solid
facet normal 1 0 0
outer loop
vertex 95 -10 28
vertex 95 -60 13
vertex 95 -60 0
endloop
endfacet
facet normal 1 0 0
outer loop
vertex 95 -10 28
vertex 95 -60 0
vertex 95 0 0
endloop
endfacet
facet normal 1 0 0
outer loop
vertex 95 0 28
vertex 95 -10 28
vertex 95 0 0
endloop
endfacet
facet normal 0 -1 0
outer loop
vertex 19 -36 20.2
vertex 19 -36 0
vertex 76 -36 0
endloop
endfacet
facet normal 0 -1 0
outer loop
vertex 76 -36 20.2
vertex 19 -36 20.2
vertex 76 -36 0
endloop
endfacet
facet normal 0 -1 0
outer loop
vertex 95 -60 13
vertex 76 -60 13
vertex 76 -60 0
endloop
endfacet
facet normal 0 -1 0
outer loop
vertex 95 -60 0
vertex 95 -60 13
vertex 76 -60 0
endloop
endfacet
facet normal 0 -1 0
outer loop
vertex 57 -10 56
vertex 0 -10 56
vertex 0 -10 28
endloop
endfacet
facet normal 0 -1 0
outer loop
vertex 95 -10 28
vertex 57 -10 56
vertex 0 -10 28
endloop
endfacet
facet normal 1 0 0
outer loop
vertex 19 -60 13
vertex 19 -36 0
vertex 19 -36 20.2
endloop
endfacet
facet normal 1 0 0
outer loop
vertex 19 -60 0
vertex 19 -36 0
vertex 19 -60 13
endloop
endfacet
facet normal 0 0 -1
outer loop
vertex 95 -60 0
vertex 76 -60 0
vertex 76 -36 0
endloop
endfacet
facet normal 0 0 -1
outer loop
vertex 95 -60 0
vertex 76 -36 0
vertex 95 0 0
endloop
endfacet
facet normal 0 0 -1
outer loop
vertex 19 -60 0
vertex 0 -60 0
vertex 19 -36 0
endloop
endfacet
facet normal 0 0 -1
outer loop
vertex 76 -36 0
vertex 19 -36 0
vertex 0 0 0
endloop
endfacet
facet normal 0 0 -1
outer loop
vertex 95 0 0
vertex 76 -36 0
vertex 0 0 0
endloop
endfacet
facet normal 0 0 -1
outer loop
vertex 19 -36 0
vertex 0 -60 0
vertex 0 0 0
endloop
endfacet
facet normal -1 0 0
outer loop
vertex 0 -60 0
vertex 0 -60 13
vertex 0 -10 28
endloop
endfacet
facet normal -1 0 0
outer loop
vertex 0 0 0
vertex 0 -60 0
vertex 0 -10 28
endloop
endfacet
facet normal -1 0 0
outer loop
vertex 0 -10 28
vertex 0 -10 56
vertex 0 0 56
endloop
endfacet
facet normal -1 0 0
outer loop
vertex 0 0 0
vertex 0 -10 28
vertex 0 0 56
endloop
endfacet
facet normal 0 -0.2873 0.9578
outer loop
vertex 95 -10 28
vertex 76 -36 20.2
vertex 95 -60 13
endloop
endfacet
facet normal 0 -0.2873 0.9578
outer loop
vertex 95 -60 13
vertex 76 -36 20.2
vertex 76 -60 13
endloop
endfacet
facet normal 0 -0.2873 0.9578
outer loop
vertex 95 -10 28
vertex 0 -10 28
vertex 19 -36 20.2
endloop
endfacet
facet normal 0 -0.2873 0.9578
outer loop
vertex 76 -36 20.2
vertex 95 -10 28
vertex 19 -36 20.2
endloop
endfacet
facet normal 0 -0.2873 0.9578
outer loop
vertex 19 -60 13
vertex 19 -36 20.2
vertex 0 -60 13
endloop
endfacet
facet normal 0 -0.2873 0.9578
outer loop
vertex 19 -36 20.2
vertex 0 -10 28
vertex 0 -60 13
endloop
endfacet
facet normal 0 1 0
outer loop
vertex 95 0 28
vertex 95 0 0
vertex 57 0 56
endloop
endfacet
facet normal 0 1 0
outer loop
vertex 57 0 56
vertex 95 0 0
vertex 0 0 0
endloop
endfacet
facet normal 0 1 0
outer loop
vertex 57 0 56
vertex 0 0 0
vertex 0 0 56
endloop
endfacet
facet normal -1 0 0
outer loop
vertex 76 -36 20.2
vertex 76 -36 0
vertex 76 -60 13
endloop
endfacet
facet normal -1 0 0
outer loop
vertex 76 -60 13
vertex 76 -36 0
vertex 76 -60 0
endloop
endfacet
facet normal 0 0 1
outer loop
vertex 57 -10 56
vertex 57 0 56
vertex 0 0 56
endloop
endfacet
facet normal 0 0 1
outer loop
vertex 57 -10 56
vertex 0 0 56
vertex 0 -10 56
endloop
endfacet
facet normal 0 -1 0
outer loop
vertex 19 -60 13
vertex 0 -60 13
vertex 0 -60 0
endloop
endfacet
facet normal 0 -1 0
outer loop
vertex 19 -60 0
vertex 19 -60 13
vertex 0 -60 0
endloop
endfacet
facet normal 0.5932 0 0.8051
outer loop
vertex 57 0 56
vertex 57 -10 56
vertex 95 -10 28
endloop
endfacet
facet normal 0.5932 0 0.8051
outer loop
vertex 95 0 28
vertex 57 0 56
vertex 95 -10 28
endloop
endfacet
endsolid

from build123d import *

# Parameters (mm, degrees)
F1_DEPTH = 95
F3_DEPTH = 10.001
F4_W     = 57
F4_H     = 24
F6_DEPTH = 180
F7_W     = 57
F7_H     = 24
F8_DEPTH = 56.001
F9_DEPTH = 179


# Not quite as in the source:
# - an extrude ends at something that could not be found from the text; its depth is read off the source's solid
# - a feature of the source that left no trace in its solid (it failed there, or was rolled back) is left out
# - a feature names something its author has since deleted; it is built from what else it names


with BuildPart() as f1:
    # F0 (on Right) → F1 (new body)
    with BuildSketch(Plane.YZ):
        Polygon((0, 56), (-10, 56), (-10, 28), (-60, 13), (-60, 0), (0, 0), align=None)
    extrude(amount=F1_DEPTH)

    # F2 (on face) → F3 (cut, through all)
    with BuildSketch(Plane.XZ.offset(10)):
        Polygon((95, 56), (57, 56), (95, 28), align=None)
    extrude(amount=-F3_DEPTH, mode=Mode.SUBTRACT)

    # F4 (on face) → F6 (cut, through all)
    with BuildSketch(Plane(origin=(0, 0, 0), x_dir=(1, 0, 0), z_dir=(0, 0, -1))):
        with Locations((47.5, 48)):
            Rectangle(F4_W, F4_H)
    extrude(amount=F6_DEPTH, mode=Mode.SUBTRACT)

    # F7 (on face) → F8 (cut, through all)
    with BuildSketch(Plane(origin=(0, 0, 0), x_dir=(1, 0, 0), z_dir=(0, 0, -1))):
        with Locations((47.5, 48)):
            Rectangle(F7_W, F7_H)
    extrude(amount=-F8_DEPTH, mode=Mode.SUBTRACT)

    # F4 (on face) → F9 (cut, through all)
    with BuildSketch(Plane(origin=(0, 0, 0), x_dir=(1, 0, 0), z_dir=(0, 0, -1))):
        with Locations((47.5, 48)):
            Rectangle(F4_W, F4_H)
    extrude(amount=F9_DEPTH, mode=Mode.SUBTRACT)


solid = f1.part
